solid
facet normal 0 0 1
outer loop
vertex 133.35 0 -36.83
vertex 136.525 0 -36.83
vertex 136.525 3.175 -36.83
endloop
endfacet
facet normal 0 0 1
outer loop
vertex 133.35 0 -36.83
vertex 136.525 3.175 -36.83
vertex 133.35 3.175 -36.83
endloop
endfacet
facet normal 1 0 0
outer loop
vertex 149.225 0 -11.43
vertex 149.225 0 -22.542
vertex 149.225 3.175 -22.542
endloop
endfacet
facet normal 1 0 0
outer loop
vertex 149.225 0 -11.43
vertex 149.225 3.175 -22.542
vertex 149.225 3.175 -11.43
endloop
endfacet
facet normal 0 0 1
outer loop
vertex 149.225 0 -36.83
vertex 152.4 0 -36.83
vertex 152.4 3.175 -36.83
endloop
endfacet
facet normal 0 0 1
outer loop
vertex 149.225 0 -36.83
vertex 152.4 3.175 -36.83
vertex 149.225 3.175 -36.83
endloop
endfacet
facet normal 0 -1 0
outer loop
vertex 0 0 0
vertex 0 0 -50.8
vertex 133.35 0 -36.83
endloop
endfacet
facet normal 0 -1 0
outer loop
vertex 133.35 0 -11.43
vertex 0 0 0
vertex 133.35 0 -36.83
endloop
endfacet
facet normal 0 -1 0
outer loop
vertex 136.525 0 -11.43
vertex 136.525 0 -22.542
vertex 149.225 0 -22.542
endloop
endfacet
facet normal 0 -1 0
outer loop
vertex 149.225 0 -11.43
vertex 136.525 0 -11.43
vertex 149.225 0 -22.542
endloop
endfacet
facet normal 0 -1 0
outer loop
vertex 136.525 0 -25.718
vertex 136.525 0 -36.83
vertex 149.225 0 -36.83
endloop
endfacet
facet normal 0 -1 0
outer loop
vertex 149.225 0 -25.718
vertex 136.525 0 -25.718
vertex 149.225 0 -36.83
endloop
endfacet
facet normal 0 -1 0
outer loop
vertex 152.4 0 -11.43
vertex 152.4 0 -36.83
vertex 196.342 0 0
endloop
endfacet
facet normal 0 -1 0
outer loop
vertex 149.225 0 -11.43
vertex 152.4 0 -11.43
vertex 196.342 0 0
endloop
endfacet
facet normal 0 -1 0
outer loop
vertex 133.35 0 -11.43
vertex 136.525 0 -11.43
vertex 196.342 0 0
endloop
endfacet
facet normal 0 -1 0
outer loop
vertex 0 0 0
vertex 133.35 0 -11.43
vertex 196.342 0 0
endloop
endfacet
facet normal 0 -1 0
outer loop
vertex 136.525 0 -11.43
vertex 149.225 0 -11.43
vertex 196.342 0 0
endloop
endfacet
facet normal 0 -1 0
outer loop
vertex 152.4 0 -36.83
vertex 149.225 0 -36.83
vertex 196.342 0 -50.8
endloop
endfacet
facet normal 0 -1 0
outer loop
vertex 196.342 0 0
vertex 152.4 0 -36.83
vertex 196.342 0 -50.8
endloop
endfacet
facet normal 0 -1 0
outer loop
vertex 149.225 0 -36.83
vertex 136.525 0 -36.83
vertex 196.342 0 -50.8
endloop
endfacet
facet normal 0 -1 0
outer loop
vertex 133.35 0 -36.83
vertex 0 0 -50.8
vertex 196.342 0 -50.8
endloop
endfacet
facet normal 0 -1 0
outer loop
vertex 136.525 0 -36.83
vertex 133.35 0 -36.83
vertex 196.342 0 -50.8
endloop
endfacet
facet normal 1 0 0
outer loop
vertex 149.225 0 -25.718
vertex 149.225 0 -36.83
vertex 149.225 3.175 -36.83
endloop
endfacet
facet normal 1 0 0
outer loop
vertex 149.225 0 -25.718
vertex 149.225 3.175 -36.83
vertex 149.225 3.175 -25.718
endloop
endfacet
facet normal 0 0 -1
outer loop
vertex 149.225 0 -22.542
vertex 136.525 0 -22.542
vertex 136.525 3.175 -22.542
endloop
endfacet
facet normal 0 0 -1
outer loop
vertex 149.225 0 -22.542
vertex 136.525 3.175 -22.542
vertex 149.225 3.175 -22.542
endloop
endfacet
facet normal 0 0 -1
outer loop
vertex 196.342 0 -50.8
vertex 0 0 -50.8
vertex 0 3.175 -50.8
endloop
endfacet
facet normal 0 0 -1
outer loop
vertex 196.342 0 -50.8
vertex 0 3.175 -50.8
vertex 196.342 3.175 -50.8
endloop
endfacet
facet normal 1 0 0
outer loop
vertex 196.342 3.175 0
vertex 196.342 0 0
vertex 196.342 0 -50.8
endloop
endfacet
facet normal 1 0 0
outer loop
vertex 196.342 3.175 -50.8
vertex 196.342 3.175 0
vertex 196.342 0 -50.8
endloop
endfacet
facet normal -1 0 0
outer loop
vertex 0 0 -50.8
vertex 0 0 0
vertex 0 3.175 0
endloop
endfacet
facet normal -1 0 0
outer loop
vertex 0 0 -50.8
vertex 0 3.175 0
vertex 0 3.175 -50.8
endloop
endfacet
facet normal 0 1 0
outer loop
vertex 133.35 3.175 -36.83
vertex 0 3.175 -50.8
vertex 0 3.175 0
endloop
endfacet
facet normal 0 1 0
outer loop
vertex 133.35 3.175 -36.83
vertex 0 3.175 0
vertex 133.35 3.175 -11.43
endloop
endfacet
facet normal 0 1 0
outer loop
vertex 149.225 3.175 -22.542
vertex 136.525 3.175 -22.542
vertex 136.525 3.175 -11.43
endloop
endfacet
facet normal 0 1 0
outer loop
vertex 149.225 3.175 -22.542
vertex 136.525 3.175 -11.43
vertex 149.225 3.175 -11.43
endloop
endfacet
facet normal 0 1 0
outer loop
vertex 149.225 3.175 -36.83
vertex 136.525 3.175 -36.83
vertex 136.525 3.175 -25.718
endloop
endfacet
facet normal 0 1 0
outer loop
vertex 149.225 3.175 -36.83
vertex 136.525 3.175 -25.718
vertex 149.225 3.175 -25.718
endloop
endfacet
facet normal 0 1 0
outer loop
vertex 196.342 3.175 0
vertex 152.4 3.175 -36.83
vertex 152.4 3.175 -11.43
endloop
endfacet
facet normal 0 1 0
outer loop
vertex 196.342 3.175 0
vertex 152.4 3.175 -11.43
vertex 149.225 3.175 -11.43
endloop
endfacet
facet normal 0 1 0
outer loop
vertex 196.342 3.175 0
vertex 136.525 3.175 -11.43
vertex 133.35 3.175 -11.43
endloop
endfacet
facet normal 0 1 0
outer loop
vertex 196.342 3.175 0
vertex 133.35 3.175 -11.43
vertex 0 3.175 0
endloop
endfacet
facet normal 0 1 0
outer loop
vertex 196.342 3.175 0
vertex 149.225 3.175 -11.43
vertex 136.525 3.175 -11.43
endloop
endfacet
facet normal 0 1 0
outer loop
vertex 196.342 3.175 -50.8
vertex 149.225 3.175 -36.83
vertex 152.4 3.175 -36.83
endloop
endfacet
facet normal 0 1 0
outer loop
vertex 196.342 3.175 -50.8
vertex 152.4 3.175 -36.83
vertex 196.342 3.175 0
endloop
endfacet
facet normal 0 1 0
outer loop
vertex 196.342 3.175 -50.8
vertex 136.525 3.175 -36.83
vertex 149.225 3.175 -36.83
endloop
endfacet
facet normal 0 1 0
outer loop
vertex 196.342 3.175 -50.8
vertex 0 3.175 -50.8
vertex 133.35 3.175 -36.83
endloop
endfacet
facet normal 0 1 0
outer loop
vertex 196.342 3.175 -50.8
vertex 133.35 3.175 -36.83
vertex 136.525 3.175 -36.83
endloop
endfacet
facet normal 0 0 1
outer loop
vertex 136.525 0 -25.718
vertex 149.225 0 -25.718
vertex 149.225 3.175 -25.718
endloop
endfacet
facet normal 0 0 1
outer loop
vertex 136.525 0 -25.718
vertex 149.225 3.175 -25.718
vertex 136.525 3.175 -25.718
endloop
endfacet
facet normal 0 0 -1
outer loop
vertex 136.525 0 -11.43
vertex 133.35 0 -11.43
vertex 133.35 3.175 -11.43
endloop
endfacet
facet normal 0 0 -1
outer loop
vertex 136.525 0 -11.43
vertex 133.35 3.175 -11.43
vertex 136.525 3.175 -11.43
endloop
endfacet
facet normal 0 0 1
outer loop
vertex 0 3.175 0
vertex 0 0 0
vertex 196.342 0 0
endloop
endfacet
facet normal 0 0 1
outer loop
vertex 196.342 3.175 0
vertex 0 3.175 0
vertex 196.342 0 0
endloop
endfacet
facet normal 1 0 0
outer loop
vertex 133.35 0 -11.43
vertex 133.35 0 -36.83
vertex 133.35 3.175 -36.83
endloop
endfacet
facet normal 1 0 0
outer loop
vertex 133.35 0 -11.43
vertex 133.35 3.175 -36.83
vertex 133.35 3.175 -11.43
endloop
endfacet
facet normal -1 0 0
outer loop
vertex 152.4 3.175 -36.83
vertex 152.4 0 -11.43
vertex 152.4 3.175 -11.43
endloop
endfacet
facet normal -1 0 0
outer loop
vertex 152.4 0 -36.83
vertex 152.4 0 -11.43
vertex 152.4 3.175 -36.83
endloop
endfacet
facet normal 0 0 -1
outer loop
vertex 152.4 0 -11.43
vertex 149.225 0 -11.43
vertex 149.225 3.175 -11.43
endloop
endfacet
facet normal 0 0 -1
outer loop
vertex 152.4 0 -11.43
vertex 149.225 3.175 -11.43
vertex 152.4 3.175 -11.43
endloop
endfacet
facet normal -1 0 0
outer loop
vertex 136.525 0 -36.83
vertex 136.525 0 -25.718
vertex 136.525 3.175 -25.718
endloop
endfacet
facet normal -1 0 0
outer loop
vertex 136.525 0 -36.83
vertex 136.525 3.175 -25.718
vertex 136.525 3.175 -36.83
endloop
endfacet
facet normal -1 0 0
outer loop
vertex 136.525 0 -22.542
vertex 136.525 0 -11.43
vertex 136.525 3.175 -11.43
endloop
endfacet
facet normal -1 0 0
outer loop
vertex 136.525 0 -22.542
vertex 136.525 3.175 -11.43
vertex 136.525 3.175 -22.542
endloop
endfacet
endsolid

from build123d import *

# Parameters (mm, degrees)
SKETCH1_W           = 196.342
SKETCH1_H           = 50.8
BOSS_EXTRUDE1_DEPTH = 3.175
CUT_EXTRUDE1_DEPTH  = 7.62


with BuildPart() as part:
    # Sketch1 → Boss-Extrude1 (new body)
    with BuildSketch(Plane(origin=(0, 0, 0), x_dir=(1, 0, 0), z_dir=(0, 1, 0))):
        with Locations((98.171, 25.4)):
            Rectangle(SKETCH1_W, SKETCH1_H)
    extrude(amount=BOSS_EXTRUDE1_DEPTH)

    # Sketch2 → Cut-Extrude1 (cut)
    with BuildSketch(Plane.XZ):
        Polygon((136.525, -25.7175), (136.525, -36.83), (133.35, -36.83), (133.35, -11.43), (136.525, -11.43), (136.525, -22.5425), (149.225, -22.5425), (149.225, -11.43), (152.4, -11.43), (152.4, -36.83), (149.225, -36.83), (149.225, -25.7175), align=None)
    extrude(amount=-CUT_EXTRUDE1_DEPTH, mode=Mode.SUBTRACT)


solid = part.part
